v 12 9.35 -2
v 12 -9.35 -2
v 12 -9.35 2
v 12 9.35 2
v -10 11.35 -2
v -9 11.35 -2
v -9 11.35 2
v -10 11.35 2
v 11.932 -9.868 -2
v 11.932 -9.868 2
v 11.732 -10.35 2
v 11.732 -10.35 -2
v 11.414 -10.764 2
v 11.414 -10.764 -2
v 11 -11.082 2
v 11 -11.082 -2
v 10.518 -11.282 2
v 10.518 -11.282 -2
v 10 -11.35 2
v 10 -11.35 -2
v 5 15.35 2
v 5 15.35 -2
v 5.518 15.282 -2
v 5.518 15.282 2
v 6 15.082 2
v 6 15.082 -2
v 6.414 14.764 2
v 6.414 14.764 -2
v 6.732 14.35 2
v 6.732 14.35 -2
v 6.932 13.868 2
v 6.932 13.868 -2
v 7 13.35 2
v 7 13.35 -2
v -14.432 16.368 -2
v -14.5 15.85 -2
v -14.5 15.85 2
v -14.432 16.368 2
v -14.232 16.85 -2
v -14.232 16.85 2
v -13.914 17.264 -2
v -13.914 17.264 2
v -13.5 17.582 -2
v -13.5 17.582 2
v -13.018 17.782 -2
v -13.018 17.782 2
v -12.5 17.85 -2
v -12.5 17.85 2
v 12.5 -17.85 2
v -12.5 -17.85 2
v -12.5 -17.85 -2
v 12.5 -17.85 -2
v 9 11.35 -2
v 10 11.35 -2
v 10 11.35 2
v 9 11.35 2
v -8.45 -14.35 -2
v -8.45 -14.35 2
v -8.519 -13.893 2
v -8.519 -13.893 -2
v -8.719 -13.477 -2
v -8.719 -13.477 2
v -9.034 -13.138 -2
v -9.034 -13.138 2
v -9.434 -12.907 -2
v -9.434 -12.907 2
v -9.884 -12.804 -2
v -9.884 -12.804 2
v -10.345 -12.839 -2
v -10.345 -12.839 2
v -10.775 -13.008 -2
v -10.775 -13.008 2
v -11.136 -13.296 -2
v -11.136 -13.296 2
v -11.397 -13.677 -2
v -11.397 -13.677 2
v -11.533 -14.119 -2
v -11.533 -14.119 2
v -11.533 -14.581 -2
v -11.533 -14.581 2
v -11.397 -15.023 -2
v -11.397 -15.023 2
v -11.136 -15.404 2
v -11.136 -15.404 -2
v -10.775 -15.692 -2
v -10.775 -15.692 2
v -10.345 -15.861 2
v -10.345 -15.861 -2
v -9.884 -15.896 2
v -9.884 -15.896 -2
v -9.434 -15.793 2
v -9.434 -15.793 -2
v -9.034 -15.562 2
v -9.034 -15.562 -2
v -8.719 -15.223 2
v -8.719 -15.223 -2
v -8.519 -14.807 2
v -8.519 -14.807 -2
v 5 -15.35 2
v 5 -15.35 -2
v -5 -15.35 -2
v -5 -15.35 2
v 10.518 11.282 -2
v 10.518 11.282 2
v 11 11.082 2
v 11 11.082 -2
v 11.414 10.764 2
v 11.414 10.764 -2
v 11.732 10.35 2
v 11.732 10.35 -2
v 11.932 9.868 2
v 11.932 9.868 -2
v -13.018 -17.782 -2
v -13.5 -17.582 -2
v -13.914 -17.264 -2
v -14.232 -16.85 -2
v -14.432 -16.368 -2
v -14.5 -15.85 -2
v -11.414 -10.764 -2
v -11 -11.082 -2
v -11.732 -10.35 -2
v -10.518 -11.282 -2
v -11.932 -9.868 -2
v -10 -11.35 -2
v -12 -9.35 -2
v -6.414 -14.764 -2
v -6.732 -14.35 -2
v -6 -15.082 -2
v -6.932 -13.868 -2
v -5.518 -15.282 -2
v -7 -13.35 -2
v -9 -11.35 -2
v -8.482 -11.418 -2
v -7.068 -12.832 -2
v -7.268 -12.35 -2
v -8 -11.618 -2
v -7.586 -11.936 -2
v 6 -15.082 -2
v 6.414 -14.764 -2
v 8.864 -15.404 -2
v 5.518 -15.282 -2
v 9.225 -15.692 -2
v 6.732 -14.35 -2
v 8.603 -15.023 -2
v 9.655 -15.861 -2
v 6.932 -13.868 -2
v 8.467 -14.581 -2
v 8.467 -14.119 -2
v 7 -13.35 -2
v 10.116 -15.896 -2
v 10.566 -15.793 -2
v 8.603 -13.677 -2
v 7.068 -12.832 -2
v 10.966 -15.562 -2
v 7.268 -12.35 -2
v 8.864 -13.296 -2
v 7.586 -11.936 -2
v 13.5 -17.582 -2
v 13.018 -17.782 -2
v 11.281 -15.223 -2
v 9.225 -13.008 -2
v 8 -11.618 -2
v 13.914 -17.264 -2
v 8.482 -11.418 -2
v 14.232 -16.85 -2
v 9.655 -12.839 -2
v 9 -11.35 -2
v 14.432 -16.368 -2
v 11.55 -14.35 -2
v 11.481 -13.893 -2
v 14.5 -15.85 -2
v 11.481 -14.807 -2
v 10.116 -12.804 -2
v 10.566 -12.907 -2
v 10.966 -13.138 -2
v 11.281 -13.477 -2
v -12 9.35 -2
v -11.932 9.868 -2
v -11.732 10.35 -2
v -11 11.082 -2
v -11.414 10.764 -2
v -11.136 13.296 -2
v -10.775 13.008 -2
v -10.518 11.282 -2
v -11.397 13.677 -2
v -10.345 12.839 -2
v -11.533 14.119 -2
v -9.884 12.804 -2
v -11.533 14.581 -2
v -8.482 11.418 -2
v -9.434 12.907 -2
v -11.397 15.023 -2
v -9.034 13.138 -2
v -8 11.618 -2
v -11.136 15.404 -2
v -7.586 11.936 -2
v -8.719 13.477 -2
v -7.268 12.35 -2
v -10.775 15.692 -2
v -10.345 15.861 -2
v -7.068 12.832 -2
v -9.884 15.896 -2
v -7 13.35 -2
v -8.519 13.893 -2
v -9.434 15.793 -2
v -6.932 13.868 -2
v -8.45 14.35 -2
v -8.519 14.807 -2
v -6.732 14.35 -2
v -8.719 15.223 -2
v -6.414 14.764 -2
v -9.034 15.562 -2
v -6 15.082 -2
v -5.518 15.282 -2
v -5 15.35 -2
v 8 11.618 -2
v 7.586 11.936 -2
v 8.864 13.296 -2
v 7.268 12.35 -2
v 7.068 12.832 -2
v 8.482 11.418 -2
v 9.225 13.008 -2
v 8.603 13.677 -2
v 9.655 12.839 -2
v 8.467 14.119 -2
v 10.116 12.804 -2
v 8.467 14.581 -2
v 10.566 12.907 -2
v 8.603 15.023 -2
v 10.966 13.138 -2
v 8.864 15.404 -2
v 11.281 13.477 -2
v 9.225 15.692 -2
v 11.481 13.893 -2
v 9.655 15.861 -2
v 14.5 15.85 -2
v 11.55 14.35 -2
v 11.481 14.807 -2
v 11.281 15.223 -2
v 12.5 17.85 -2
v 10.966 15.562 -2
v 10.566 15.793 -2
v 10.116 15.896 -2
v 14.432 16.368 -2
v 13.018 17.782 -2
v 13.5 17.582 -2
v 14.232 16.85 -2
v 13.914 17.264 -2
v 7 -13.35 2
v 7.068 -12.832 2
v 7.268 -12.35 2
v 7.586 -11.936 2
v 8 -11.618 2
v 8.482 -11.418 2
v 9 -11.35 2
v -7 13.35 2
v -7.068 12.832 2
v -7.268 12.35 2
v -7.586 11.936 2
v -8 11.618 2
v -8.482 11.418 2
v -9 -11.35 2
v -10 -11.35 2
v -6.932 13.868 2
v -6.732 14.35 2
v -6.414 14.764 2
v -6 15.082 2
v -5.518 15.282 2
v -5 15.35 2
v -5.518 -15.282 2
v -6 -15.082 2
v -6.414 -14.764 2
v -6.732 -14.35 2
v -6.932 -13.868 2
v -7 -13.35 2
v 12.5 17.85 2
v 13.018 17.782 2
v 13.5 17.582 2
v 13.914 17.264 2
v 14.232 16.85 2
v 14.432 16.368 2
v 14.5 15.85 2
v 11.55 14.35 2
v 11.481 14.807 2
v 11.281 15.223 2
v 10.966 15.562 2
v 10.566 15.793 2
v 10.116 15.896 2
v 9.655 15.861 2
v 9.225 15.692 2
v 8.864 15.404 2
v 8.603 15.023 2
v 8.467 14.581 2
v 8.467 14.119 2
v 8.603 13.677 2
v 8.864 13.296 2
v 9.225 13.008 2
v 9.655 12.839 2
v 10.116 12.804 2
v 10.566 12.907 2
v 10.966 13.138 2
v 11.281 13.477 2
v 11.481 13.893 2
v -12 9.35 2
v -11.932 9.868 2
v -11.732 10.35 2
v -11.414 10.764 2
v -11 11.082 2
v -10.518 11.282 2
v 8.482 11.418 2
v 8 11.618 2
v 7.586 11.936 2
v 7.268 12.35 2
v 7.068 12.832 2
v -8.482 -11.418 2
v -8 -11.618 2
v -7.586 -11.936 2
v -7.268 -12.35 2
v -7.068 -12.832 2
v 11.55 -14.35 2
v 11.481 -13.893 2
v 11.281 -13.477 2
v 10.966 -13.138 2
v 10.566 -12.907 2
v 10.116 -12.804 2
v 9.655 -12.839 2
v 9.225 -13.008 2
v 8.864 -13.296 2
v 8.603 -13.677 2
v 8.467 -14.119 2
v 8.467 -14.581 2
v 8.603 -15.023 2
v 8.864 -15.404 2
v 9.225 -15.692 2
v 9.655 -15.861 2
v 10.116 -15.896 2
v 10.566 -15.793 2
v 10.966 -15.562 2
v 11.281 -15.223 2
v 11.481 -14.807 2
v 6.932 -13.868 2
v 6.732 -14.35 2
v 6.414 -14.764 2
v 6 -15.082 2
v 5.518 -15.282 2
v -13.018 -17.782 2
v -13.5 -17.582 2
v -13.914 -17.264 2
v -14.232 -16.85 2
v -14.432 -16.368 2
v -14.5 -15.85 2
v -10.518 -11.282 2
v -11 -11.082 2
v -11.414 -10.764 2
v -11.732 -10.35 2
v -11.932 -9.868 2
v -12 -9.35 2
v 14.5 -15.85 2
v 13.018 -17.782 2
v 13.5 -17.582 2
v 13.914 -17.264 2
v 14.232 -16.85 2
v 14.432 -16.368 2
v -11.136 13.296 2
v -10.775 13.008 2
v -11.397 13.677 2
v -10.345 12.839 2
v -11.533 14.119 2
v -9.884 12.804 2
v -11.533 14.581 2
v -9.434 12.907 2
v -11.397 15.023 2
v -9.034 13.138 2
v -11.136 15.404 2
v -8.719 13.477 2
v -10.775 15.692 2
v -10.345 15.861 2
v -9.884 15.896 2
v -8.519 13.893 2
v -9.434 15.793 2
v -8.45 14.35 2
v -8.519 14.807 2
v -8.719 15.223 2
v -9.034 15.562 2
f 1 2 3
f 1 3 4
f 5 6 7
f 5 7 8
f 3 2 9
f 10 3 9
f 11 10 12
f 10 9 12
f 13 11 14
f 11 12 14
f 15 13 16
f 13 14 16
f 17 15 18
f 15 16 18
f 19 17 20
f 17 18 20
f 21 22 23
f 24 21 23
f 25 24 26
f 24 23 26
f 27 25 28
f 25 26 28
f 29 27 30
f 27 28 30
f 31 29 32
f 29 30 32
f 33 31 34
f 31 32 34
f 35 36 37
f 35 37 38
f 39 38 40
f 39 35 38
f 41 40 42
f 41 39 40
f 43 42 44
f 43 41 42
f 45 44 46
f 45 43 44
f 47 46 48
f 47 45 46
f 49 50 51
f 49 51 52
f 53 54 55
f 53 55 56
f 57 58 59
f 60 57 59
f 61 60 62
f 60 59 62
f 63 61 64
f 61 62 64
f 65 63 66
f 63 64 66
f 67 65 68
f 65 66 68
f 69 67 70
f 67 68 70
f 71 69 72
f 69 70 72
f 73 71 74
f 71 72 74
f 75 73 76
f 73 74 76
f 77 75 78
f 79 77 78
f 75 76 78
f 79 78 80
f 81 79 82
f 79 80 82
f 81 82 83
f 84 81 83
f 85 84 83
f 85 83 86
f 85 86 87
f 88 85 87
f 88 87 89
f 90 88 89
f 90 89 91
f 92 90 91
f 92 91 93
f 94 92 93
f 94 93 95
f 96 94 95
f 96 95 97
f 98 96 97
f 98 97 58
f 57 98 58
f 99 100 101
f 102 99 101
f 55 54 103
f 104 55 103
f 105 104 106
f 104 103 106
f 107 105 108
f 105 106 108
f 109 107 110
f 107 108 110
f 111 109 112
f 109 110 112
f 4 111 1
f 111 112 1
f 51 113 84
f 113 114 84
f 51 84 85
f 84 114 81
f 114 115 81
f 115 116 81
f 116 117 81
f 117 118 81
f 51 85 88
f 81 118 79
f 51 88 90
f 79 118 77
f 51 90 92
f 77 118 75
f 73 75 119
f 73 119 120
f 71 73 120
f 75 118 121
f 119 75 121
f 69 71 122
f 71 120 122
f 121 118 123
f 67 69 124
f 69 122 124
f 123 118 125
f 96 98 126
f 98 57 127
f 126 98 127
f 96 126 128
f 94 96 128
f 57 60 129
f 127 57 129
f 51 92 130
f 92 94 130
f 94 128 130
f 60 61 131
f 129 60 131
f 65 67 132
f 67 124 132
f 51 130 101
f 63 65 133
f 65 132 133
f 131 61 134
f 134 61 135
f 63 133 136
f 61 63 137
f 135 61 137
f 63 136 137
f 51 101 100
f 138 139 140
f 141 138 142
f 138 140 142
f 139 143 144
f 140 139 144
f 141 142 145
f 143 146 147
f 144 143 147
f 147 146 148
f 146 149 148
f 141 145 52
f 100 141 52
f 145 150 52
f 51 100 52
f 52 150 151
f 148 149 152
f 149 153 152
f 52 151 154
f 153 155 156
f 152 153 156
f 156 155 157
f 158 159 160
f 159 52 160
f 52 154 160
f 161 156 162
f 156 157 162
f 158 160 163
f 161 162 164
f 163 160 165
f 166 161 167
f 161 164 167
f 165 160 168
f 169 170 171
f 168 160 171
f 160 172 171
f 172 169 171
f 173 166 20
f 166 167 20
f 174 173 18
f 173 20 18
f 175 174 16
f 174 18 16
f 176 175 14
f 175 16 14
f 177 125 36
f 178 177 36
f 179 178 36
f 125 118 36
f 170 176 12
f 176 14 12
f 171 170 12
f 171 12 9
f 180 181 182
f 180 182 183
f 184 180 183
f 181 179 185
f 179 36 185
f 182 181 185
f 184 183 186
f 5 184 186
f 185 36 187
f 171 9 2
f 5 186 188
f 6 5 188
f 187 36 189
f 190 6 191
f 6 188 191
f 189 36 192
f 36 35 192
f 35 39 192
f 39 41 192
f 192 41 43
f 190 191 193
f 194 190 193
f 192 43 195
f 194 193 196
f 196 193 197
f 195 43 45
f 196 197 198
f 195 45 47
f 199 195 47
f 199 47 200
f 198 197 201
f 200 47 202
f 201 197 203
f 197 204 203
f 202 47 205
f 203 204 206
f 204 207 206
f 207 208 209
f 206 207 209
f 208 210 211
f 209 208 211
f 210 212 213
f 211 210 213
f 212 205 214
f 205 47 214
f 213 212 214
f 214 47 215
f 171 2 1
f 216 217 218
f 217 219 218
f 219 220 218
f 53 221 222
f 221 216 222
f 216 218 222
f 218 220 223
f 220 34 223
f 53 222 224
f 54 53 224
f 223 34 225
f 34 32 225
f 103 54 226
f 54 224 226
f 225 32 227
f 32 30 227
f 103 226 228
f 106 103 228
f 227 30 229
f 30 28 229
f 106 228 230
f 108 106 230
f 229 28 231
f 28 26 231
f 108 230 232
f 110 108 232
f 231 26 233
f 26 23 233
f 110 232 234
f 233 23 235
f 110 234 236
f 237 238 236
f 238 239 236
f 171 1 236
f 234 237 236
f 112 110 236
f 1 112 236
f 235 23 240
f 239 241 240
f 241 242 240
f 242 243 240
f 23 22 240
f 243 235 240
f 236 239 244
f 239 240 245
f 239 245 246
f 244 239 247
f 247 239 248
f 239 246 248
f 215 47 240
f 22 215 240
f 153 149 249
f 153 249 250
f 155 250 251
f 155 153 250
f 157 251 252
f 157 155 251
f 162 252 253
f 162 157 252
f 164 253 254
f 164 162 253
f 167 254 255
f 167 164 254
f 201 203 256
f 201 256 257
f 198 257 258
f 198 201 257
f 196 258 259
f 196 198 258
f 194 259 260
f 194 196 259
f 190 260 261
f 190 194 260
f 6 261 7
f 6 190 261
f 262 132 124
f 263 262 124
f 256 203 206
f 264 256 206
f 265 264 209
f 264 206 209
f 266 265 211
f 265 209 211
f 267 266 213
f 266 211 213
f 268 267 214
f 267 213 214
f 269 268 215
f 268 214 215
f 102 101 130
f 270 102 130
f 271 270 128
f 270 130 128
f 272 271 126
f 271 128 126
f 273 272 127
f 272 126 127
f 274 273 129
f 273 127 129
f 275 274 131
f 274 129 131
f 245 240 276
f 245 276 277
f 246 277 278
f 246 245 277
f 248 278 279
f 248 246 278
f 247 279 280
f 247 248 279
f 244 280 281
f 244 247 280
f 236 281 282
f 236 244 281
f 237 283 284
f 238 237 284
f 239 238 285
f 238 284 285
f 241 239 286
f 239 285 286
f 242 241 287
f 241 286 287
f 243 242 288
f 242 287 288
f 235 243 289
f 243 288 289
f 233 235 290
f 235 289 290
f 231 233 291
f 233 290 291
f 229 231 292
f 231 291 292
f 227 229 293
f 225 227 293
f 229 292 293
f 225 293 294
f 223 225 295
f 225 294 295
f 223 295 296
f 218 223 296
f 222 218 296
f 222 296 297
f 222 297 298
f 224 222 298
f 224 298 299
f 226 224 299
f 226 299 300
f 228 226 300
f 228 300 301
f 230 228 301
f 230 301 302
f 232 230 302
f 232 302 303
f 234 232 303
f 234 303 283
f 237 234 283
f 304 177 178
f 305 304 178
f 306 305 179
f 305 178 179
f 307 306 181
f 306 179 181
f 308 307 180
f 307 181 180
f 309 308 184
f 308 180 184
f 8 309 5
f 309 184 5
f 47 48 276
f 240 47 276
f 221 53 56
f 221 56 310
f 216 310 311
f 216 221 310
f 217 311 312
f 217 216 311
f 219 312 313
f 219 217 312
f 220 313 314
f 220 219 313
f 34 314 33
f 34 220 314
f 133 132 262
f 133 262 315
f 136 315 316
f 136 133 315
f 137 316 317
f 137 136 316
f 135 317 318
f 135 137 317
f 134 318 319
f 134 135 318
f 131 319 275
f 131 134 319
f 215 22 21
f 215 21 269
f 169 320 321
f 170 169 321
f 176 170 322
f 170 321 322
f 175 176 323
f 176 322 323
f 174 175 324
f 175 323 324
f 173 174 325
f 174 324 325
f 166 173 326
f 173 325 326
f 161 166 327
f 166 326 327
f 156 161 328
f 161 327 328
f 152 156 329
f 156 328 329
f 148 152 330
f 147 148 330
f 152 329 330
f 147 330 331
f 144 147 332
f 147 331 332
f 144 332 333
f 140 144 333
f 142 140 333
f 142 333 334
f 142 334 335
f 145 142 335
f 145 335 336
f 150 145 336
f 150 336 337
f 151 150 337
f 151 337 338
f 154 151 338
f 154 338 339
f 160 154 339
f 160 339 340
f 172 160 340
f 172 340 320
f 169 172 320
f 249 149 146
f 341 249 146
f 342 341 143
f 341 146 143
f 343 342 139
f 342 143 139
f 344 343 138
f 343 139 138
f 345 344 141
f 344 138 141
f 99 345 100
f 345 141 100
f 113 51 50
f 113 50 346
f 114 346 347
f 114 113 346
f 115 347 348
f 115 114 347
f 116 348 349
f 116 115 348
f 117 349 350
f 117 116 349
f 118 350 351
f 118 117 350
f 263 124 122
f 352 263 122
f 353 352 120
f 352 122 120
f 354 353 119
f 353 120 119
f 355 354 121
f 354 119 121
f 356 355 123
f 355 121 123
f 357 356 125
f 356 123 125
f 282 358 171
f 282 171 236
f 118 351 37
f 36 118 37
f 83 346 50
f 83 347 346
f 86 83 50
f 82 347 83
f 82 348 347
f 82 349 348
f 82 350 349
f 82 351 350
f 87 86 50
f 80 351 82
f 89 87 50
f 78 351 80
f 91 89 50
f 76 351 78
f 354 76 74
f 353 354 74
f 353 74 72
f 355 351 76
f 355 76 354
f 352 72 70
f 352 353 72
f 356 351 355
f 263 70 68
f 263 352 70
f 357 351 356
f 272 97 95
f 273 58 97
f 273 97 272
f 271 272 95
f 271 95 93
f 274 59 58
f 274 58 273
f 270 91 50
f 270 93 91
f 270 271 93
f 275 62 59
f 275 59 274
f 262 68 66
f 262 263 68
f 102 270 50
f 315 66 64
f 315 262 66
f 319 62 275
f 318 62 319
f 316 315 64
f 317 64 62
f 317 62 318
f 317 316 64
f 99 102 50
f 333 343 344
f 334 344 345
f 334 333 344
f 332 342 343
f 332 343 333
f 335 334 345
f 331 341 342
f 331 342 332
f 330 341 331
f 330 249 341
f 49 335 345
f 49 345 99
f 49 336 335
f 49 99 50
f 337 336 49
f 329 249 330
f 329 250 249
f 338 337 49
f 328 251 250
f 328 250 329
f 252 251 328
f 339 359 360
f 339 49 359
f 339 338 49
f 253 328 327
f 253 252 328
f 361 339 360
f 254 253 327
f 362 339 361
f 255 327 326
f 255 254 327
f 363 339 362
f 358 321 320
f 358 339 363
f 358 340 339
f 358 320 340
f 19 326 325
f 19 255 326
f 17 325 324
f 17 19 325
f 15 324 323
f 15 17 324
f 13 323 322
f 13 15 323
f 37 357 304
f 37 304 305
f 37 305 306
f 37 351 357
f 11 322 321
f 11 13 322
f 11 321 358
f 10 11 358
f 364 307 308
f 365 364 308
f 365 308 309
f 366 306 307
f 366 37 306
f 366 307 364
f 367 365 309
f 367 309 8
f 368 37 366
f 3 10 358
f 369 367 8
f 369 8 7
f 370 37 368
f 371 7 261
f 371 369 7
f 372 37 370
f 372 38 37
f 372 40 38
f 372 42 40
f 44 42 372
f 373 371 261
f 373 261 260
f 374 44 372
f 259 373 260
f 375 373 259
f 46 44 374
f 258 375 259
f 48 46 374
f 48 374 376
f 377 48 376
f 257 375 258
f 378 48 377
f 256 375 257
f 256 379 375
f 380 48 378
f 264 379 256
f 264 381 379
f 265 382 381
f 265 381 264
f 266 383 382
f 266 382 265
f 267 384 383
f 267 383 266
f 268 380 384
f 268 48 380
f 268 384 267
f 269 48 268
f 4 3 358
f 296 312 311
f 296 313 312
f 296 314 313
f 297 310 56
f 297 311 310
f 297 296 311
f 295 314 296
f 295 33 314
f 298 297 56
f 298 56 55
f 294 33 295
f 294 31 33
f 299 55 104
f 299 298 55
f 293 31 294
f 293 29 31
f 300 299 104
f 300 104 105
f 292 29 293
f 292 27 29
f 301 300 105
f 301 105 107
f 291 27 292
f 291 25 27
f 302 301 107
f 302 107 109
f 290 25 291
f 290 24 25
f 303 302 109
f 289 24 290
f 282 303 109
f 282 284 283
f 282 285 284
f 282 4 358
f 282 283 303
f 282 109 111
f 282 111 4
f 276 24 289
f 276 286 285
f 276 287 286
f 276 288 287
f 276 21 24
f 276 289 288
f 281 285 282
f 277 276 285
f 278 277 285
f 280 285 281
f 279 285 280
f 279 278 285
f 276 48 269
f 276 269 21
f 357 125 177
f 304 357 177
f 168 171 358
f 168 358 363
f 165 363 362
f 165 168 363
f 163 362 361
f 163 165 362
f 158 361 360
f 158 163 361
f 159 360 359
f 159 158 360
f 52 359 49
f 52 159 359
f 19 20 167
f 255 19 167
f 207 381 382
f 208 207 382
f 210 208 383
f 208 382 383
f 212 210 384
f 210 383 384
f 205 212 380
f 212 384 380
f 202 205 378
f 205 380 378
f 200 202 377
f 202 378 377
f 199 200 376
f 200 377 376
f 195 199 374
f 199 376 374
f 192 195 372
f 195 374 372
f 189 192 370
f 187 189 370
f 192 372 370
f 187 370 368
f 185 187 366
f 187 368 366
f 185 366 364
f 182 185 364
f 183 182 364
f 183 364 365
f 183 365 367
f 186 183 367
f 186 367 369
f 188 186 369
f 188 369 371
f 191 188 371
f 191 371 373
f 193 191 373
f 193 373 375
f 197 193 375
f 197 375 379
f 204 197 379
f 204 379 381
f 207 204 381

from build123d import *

# Parameters (mm, degrees)
SKETCH_1_W          = 29
SKETCH_1_H          = 35.7
EXTRUDE_1_DEPTH     = 2
SKETCH_2_R          = 1.55
CUT_EXTRUDE_1_DEPTH = 24
SKETCH_4_W          = 24
SKETCH_4_H          = 22.7
CUT_EXTRUDE_2_DEPTH = 10
SKETCH_5_W          = 14
SKETCH_5_H          = 30.7
CUT_EXTRUDE_3_DEPTH = 10
FILLET_START        = -2
FILLET_1_DEPTH      = 4
FILLET_1_2_DEPTH    = 4


with BuildPart() as part:
    # 草图1 → 凸台-拉伸1 (new, symmetric)
    with BuildSketch(Plane.XY):
        Rectangle(SKETCH_1_W, SKETCH_1_H)
    extrude(amount=EXTRUDE_1_DEPTH, both=True)

    # 草图2 → 切除-拉伸1 (cut)
    with BuildSketch(Plane.XY.offset(2)):
        with Locations((10, 14.35)):
            Circle(SKETCH_2_R)
        with Locations((10, -14.35)):
            Circle(SKETCH_2_R)
        with Locations((-10, -14.35)):
            Circle(SKETCH_2_R)
        with Locations((-10, 14.35)):
            Circle(SKETCH_2_R)
    extrude(amount=-CUT_EXTRUDE_1_DEPTH, mode=Mode.SUBTRACT)

    # 草图4 → 切除-拉伸2 (cut)
    with BuildSketch(Plane(origin=(0, 0, -2), x_dir=(-1, 0, 0), z_dir=(0, 0, -1))):
        Rectangle(SKETCH_4_W, SKETCH_4_H)
    extrude(amount=-CUT_EXTRUDE_2_DEPTH, mode=Mode.SUBTRACT)

    # 草图5 → 切除-拉伸3 (cut)
    with BuildSketch(Plane(origin=(0, 0, -2), x_dir=(-1, 0, 0), z_dir=(0, 0, -1))):
        Rectangle(SKETCH_5_W, SKETCH_5_H)
    extrude(amount=-CUT_EXTRUDE_3_DEPTH, mode=Mode.SUBTRACT)

    # 圆角1: read off the stored shape, not the designer's step
    # 圆角1 outline → 圆角1 (cut)
    with BuildSketch(Plane.XY.offset(FILLET_START)):
        with BuildLine():
            Line((14.5, -17.85), (14.5, -15.85))
            ThreePointArc((14.5, -15.85), (13.914213562, -17.264213562), (12.5, -17.85))
            Line((12.5, -17.85), (14.5, -17.85))
        make_face()
        with BuildLine():
            ThreePointArc((12.5, 17.85), (13.914213562, 17.264213562), (14.5, 15.85))
            Line((14.5, 15.85), (14.5, 17.85))
            Line((14.5, 17.85), (12.5, 17.85))
        make_face()
        with BuildLine():
            Line((-14.5, -17.85), (-12.5, -17.85))
            ThreePointArc((-12.5, -17.85), (-13.914213562, -17.264213562), (-14.5, -15.85))
            Line((-14.5, -15.85), (-14.5, -17.85))
        make_face()
        with BuildLine():
            ThreePointArc((-14.5, 15.85), (-13.914213562, 17.264213562), (-12.5, 17.85))
            Line((-12.5, 17.85), (-14.5, 17.85))
            Line((-14.5, 17.85), (-14.5, 15.85))
        make_face()
        with BuildLine():
            ThreePointArc((7, -13.35), (7.585786438, -11.935786438), (9, -11.35))
            Line((9, -11.35), (7, -11.35))
            Line((7, -11.35), (7, -13.35))
        make_face()
        with BuildLine():
            ThreePointArc((-9, -11.35), (-7.585786438, -11.935786438), (-7, -13.35))
            Line((-7, -13.35), (-7, -11.35))
            Line((-7, -11.35), (-9, -11.35))
        make_face()
        with BuildLine():
            Line((7, 11.35), (9, 11.35))
            ThreePointArc((9, 11.35), (7.585786438, 11.935786438), (7, 13.35))
            Line((7, 13.35), (7, 11.35))
        make_face()
        with BuildLine():
            Line((-7, 11.35), (-7, 13.35))
            ThreePointArc((-7, 13.35), (-7.585786438, 11.935786438), (-9, 11.35))
            Line((-9, 11.35), (-7, 11.35))
        make_face()
    extrude(amount=FILLET_1_DEPTH, mode=Mode.SUBTRACT)

    # Fillet 1 2 outline → Fillet 1 2 (add)
    with BuildSketch(Plane.XY.offset(FILLET_START)):
        with BuildLine():
            Line((7, -15.35), (7, -13.35))
            ThreePointArc((7, -13.35), (6.414213562, -14.764213562), (5, -15.35))
            Line((5, -15.35), (7, -15.35))
        make_face()
        with BuildLine():
            ThreePointArc((12, -9.35), (11.414213562, -10.764213562), (10, -11.35))
            Line((10, -11.35), (12, -11.35))
            Line((12, -11.35), (12, -9.35))
        make_face()
        with BuildLine():
            Line((-7, -15.35), (-5, -15.35))
            ThreePointArc((-5, -15.35), (-6.414213562, -14.764213562), (-7, -13.35))
            Line((-7, -13.35), (-7, -15.35))
        make_face()
        with BuildLine():
            ThreePointArc((10, 11.35), (11.414213562, 10.764213562), (12, 9.35))
            Line((12, 9.35), (12, 11.35))
            Line((12, 11.35), (10, 11.35))
        make_face()
        with BuildLine():
            Line((-12, -11.35), (-10, -11.35))
            ThreePointArc((-10, -11.35), (-11.414213562, -10.764213562), (-12, -9.35))
            Line((-12, -9.35), (-12, -11.35))
        make_face()
        with BuildLine():
            ThreePointArc((5, 15.35), (6.414213562, 14.764213562), (7, 13.35))
            Line((7, 13.35), (7, 15.35))
            Line((7, 15.35), (5, 15.35))
        make_face()
        with BuildLine():
            Line((-12, 11.35), (-12, 9.35))
            ThreePointArc((-12, 9.35), (-11.414213562, 10.764213562), (-10, 11.35))
            Line((-10, 11.35), (-12, 11.35))
        make_face()
        with BuildLine():
            ThreePointArc((-7, 13.35), (-6.414213562, 14.764213562), (-5, 15.35))
            Line((-5, 15.35), (-7, 15.35))
            Line((-7, 15.35), (-7, 13.35))
        make_face()
    extrude(amount=FILLET_1_2_DEPTH)


solid = part.part
